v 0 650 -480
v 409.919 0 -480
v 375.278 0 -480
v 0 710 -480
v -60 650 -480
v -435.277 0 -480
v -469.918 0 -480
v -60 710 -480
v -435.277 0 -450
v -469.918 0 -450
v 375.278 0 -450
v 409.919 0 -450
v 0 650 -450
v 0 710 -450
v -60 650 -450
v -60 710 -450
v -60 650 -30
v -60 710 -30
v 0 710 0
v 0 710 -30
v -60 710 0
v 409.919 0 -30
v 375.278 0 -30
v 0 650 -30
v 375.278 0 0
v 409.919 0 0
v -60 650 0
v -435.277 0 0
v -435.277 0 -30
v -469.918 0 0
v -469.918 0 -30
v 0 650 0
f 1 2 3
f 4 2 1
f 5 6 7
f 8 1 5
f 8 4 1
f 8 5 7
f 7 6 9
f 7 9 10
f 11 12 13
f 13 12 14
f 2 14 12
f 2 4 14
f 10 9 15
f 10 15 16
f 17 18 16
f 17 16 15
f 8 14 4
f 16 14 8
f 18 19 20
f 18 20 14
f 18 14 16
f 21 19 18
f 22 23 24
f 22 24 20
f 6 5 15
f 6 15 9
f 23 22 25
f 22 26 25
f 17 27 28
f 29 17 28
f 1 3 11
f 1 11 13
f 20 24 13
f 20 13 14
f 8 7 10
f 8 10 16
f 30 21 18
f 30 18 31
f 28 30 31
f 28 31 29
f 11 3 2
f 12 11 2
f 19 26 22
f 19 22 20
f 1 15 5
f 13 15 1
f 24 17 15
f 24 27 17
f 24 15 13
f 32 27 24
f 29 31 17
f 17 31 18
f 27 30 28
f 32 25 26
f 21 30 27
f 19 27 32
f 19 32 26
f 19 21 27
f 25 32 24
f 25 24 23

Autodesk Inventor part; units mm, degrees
ref_plane "YZ Plane" through (0, 0, 0) normal (1, 0, 0) x (0, 1, 0)
ref_plane "XZ Plane" through (0, 0, 0) normal (0, 1, 0) x (-1, 0, 0)
ref_plane "XY Plane" through (0, 0, 0) normal (0, 0, 1) x (1, 0, 0)
sketch "Sketch1" plane through (0, 0, 0) normal (0, 0, 1) x (1, 0, 0)
  point P0 (0, 0)
sketch "Sketch2" plane through (0, 0, 0) normal (0, 0, 1) x (1, 0, 0)
  line L0 (0, 650) -> (375.2777, 0)
  line L1 (409.9187, 0) -> (375.2777, 0)
  line L2 (409.9187, 0) -> (0, 710)
  line L3 (0, 650) -> (0, 710)
  point P0 (0, 0)
  dimension "d0" = 650
extrude "Extrusion1" add sketch "Sketch2" against normal blind 30
sketch "Sketch3" plane through (0, 0, 0) normal (0, 0, 1) x (1, 0, 0)
  line L0 (0, 650) -> (0, 710) projected
  line L1 (0, 650) -> (-60, 650)
  line L2 (-60, 650) -> (-60, 710)
  line L3 (-60, 710) -> (0, 710)
  line L4 (0, 710) -> (0, 650)
  line L5 (-60, 650) -> (-435.277, 0)
  line L6 (-60, 710) -> (-469.918, 0)
  line L7 (-469.918, 0) -> (-435.277, 0)
  point P0 (0, 0)
  dimension "d5" = 60
  dimension "d6" = 750.555
extrude "Extrusion2" add sketch "Sketch3" against normal blind 30 contours L5 L7 L6 L2
sketch "Sketch4" plane through (0, 0, 0) normal (0, 0, 1) x (1, 0, 0)
  line L0 (0, 710) -> (409.9187, 0) projected
  line L1 (-60, 650) -> (0, 650)
  line L2 (0, 650) -> (0, 710)
  line L3 (0, 710) -> (-60, 710)
  line L4 (-60, 710) -> (-60, 650)
  point P0 (0, 0)
extrude "Extrusion3" add sketch "Sketch4" against normal blind 60
sketch "Sketch5" plane through (0, 0, 0) normal (0, 0, 1) x (1, 0, 0)
  point P0 (0, 0)
sketch "Sketch6" plane through (0, 0, -60) normal (0, 0, -1) x (-1, 0, 0)
  line L0 (0, 710) -> (-409.9187, 0) projected
  line L1 (60, 650) -> (435.277, 0) projected
  line L2 (0, 710) -> (60, 710)
  line L3 (60, 710) -> (60, 650)
  line L4 (60, 650) -> (0, 650)
  line L5 (0, 650) -> (0, 710)
  point P0 (0, 0)
extrude "Extrusion4" add sketch "Sketch6" along normal blind 420
sketch "Sketch7" plane through (0, 0, -480) normal (0, 0, -1) x (-1, 0, 0)
  line L0 (60, 650) -> (435.277, 0) projected
  line L1 (60, 650) -> (435.277, 0)
  line L2 (469.918, 0) -> (60, 710) projected
  line L3 (435.277, 0) -> (469.918, 0)
  line L4 (469.918, 0) -> (60, 710)
  line L5 (60, 710) -> (60, 650)
  point P0 (0, 0)
extrude "Extrusion5" add sketch "Sketch7" against normal blind 30
sketch "Sketch8" plane through (0, 0, -480) normal (0, 0, -1) x (-1, 0, 0)
  line L0 (-375.2777, 0) -> (0, 650) projected
  line L1 (0, 650) -> (-375.2777, 0)
  line L2 (0, 710) -> (-409.9187, 0) projected
  line L3 (-375.2777, 0) -> (-409.9187, 0)
  line L4 (-409.9187, 0) -> (0, 710)
  line L5 (0, 710) -> (0, 650)
  point P0 (0, 0)
extrude "Extrusion6" add sketch "Sketch8" against normal blind 30
properties part number "stativ ide 1"
